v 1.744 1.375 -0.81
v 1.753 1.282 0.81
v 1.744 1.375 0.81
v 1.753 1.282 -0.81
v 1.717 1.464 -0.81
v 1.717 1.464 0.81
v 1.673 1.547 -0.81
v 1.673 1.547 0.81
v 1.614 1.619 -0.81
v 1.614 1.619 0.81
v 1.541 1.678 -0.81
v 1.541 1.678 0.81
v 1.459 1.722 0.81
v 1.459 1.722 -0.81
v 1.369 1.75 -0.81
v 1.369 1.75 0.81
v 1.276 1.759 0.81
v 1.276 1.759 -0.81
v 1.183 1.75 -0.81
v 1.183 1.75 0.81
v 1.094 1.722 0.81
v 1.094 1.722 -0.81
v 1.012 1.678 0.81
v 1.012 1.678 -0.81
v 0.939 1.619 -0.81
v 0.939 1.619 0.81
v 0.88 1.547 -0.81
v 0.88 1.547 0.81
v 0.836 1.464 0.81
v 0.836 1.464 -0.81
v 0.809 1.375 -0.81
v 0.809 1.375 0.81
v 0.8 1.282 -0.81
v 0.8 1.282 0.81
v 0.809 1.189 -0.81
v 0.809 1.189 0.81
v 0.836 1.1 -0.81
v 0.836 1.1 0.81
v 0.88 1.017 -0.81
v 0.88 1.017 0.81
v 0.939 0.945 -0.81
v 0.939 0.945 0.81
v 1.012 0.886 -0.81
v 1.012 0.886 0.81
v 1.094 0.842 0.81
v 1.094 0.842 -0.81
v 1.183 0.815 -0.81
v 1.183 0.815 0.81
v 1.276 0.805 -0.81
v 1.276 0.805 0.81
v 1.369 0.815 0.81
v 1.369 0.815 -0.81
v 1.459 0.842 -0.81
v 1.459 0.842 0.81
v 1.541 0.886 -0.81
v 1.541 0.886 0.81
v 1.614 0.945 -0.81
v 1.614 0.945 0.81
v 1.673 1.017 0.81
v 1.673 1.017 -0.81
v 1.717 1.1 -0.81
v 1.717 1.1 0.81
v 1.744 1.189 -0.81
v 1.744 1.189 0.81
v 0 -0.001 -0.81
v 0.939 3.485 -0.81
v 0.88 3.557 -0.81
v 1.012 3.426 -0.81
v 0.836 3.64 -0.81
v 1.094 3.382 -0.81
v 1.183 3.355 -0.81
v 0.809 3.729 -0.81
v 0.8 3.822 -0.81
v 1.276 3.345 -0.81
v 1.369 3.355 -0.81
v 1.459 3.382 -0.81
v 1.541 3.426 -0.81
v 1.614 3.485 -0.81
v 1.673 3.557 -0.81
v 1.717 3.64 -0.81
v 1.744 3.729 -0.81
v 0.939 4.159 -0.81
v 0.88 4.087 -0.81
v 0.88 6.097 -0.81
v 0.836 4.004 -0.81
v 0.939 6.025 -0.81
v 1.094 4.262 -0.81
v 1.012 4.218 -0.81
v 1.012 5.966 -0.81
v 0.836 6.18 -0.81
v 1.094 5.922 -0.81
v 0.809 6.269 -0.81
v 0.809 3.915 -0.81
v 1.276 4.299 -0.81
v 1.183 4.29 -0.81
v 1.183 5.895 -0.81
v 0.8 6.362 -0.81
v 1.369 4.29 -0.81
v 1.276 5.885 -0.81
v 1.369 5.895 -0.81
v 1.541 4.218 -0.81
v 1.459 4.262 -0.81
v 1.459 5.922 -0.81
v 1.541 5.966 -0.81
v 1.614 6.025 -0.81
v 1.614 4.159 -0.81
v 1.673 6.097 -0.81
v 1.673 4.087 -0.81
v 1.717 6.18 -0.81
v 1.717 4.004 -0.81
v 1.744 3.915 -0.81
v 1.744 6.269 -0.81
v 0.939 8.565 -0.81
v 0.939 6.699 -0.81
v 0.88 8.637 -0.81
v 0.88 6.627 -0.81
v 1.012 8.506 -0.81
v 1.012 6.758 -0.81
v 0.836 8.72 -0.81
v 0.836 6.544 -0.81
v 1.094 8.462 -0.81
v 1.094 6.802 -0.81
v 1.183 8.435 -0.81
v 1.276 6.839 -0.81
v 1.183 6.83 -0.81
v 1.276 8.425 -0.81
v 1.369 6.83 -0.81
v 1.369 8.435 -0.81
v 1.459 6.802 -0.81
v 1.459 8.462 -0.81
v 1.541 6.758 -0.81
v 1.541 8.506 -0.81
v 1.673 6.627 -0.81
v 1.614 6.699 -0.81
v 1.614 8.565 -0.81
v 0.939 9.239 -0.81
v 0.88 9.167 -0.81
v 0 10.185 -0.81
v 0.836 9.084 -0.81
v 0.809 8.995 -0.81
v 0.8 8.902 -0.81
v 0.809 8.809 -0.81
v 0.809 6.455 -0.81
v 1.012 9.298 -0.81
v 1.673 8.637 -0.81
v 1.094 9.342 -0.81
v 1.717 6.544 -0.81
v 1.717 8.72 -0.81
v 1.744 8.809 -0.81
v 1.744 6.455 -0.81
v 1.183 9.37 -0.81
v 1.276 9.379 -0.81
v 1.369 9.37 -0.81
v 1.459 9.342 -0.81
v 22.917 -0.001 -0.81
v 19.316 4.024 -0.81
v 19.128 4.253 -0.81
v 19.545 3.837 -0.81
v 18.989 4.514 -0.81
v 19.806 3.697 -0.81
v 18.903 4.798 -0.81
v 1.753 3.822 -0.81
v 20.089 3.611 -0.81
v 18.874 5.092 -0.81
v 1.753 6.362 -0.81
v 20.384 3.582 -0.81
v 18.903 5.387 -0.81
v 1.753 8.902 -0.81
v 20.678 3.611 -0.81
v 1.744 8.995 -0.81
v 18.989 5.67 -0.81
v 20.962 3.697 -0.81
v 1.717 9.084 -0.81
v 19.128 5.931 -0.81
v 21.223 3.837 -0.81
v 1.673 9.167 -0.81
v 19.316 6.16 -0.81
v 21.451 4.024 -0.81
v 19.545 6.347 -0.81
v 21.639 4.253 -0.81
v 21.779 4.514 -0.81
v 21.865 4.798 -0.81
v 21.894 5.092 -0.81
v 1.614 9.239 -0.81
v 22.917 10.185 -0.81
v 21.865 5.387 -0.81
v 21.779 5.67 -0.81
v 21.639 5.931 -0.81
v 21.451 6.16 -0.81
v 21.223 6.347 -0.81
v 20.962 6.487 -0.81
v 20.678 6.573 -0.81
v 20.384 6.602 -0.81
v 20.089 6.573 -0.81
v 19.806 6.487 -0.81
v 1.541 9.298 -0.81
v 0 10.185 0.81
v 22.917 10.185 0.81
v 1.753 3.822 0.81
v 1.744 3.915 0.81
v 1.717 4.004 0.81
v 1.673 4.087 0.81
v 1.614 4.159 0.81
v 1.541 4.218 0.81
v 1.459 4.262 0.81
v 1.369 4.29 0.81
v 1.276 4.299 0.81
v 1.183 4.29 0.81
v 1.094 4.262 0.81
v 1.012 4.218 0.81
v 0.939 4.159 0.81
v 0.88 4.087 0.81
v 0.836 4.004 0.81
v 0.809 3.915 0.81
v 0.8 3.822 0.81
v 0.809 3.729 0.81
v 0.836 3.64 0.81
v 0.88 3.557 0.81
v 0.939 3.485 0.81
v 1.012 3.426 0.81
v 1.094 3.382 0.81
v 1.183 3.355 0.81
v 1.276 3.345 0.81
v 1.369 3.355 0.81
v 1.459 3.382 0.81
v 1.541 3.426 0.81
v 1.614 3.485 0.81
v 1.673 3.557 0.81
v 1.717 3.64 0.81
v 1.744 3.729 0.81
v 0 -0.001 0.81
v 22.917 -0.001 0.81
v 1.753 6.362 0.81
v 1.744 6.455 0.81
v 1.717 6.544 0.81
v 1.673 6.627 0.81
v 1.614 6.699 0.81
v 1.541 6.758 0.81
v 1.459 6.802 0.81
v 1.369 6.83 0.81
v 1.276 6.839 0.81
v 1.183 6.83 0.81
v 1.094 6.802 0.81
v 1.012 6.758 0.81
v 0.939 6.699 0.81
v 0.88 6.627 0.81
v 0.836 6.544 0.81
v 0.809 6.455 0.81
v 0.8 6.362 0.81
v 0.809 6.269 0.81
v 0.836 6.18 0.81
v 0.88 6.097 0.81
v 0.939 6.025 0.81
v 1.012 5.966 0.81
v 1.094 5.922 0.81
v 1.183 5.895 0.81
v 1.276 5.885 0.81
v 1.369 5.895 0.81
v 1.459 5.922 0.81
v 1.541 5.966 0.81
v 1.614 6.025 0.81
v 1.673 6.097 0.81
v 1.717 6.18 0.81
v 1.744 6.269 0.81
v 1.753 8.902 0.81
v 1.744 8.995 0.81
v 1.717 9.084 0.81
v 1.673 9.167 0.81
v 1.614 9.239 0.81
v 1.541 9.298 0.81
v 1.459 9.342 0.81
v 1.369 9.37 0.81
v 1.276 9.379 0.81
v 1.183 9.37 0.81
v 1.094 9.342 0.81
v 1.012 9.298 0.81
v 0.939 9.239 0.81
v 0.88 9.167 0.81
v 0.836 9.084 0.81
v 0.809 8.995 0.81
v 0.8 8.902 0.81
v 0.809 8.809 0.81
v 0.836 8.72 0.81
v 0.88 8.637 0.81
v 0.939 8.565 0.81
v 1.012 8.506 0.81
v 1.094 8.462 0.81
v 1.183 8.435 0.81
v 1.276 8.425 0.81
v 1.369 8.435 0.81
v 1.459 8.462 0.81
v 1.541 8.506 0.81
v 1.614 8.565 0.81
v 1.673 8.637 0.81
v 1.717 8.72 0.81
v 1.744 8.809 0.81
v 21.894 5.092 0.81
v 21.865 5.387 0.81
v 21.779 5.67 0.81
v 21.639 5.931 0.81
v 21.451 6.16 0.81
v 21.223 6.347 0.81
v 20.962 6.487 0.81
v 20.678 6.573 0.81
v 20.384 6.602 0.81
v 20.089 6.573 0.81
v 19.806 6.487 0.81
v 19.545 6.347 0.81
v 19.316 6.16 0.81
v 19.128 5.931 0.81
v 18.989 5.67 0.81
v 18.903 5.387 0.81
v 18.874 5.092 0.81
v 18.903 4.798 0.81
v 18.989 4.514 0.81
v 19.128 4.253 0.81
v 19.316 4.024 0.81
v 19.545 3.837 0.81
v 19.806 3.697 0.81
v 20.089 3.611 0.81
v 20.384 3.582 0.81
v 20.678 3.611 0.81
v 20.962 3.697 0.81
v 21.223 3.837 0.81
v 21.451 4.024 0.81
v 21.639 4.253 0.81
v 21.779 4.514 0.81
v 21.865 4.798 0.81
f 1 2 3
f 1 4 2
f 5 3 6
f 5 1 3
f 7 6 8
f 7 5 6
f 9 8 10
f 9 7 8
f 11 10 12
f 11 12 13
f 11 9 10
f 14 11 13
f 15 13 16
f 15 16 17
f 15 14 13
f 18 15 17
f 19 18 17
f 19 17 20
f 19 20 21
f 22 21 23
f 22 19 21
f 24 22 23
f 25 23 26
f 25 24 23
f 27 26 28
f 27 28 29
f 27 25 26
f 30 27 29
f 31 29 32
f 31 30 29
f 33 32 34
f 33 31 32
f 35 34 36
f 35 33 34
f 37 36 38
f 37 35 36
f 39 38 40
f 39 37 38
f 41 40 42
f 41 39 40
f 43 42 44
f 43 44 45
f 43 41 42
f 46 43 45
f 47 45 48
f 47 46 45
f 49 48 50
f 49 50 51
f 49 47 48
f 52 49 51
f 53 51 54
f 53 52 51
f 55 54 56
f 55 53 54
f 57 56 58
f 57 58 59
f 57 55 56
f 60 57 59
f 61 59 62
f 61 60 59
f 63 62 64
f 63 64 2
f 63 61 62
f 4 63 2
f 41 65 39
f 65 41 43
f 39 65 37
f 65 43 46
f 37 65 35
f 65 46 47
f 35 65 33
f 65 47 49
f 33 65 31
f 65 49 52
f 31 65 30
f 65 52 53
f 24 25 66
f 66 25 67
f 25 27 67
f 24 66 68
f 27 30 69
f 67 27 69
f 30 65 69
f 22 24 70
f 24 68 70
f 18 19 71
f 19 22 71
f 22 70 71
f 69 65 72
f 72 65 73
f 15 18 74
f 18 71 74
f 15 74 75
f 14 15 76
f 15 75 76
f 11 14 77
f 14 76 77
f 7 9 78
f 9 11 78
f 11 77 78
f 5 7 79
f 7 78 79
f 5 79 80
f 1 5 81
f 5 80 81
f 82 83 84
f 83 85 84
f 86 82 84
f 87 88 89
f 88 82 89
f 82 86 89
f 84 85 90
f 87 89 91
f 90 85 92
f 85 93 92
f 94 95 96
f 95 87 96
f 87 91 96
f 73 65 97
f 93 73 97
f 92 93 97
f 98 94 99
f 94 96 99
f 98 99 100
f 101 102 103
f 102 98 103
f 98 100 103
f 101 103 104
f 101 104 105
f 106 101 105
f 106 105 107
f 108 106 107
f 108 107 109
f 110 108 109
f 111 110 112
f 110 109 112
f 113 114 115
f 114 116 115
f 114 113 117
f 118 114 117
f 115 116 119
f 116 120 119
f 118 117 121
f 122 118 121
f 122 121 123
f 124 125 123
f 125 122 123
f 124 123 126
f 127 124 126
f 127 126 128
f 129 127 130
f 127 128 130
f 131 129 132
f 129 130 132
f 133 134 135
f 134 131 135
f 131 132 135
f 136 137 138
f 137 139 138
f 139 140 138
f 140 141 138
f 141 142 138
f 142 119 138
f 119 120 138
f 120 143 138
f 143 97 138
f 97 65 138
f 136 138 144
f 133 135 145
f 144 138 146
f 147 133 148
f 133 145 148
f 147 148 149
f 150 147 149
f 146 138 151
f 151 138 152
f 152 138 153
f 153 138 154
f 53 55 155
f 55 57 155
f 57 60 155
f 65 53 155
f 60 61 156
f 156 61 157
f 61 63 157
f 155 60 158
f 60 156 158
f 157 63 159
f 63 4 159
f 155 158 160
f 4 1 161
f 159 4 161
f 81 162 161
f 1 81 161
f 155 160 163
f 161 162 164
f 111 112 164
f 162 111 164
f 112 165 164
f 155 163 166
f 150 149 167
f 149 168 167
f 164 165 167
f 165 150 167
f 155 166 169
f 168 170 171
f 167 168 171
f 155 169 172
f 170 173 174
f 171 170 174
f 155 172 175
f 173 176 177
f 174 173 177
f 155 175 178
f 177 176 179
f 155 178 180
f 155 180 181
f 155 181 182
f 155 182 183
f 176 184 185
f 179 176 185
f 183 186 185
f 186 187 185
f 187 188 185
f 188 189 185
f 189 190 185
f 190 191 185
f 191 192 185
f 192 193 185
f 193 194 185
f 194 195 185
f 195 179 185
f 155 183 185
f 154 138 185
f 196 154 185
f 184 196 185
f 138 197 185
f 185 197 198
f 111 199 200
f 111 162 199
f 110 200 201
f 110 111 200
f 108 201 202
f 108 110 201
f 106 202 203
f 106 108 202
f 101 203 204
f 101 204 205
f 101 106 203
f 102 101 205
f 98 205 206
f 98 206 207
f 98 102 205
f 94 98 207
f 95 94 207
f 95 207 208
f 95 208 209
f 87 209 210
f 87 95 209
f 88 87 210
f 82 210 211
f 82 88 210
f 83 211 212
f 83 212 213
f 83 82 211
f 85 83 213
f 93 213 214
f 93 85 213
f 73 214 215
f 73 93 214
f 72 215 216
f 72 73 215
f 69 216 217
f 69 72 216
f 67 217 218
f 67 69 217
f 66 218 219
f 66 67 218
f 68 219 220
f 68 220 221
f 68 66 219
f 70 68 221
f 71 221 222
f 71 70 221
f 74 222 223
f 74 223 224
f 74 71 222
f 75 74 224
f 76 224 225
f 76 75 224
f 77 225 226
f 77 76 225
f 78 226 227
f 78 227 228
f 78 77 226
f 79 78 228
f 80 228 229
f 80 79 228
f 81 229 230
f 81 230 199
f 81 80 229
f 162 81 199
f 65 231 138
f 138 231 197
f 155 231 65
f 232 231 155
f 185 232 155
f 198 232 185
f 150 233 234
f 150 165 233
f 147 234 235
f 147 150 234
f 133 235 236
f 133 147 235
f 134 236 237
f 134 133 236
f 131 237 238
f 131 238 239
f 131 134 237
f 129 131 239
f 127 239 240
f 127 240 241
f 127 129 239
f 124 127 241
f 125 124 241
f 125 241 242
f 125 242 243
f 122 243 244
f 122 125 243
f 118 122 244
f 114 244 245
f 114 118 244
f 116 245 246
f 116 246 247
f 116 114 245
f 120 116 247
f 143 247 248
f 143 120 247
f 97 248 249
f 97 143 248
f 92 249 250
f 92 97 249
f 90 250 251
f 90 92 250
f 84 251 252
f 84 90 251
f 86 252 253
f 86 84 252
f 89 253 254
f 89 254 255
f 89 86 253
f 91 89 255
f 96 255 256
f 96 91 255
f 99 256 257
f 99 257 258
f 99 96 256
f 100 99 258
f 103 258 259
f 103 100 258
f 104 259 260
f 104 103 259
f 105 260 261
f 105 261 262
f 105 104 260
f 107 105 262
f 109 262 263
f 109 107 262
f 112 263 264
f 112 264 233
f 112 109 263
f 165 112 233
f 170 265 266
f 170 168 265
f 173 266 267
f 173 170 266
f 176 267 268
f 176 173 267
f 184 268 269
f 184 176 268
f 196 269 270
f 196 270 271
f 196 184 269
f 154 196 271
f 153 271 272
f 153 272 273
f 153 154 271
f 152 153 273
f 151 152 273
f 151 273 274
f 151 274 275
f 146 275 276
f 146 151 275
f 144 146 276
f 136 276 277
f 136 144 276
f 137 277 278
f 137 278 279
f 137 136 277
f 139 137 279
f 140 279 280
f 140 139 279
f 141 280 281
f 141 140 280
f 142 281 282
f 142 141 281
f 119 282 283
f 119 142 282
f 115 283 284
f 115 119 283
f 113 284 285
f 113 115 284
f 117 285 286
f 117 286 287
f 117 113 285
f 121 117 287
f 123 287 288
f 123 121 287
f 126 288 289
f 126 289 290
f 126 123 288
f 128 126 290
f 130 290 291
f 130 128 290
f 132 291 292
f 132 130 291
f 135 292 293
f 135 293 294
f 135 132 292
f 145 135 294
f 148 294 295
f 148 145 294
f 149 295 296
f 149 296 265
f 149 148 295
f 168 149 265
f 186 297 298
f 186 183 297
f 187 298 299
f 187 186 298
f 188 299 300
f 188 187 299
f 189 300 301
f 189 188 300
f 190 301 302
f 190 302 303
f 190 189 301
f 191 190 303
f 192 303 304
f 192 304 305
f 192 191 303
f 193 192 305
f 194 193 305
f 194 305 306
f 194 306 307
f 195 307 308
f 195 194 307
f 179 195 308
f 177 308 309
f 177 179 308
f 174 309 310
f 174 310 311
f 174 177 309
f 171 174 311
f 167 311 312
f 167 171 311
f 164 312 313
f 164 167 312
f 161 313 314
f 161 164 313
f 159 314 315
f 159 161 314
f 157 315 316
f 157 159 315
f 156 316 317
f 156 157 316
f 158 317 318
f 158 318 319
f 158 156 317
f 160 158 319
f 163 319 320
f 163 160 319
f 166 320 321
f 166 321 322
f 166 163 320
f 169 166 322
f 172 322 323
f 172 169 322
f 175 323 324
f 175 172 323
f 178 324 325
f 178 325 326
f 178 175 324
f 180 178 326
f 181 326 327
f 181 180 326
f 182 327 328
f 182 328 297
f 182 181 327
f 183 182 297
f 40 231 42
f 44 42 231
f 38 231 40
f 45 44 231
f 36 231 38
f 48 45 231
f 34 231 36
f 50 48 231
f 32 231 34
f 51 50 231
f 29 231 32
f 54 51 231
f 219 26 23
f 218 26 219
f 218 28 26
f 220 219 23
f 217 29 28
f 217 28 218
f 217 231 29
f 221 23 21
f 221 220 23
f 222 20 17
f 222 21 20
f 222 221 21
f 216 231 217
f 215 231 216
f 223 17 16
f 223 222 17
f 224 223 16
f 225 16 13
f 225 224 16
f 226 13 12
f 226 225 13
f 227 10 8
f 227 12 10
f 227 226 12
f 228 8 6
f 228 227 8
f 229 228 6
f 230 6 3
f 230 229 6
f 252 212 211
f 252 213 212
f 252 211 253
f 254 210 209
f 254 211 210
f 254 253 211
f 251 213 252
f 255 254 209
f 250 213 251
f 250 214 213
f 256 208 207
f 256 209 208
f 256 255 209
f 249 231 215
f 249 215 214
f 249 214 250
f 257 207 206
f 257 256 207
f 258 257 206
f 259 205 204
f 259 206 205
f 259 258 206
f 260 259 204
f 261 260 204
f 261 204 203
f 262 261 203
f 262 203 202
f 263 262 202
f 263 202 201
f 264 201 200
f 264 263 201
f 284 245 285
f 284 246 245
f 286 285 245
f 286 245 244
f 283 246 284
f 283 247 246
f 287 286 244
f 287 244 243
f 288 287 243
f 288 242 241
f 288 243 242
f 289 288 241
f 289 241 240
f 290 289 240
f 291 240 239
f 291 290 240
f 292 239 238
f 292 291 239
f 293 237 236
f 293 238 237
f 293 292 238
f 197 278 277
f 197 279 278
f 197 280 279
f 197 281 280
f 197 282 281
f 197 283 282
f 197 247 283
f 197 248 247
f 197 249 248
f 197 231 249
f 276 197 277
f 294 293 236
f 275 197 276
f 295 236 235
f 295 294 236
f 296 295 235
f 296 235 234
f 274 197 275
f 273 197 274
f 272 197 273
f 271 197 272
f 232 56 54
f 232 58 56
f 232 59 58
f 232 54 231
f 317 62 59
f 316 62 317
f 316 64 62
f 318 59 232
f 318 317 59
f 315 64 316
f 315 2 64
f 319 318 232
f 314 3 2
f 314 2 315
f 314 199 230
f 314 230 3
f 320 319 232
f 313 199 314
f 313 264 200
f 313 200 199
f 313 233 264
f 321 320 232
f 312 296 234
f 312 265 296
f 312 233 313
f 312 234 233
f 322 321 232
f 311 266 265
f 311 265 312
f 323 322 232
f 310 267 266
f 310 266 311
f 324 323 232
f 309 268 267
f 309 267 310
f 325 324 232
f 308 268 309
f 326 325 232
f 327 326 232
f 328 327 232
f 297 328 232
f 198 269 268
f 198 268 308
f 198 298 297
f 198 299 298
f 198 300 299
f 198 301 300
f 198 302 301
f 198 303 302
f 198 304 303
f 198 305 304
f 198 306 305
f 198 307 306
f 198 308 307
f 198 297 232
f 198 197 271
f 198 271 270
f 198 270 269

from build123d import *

# Parameters (mm, degrees)
SKETCH1_W           = 22.917169521
SKETCH1_H           = 10.185584258
SKETCH1_R           = 1.509847023
SKETCH1_R_2         = 0.476625594
BOSS_EXTRUDE1_DEPTH = 0.81


with BuildPart() as part:
    # Sketch1 → Boss-Extrude1 (new, symmetric)
    with BuildSketch(Plane.XY):
        with Locations((11.45856993, 5.092103028)):
            Rectangle(SKETCH1_W, SKETCH1_H)
        with Locations((20.383783826, 5.092103028)):
            Circle(SKETCH1_R, mode=Mode.SUBTRACT)
        with Locations((1.27648108, 8.902103028)):
            Circle(SKETCH1_R_2, mode=Mode.SUBTRACT)
        with Locations((1.27648108, 6.362103028)):
            Circle(SKETCH1_R_2, mode=Mode.SUBTRACT)
        with Locations((1.27648108, 3.822103028)):
            Circle(SKETCH1_R_2, mode=Mode.SUBTRACT)
        with Locations((1.27648108, 1.282103028)):
            Circle(SKETCH1_R_2, mode=Mode.SUBTRACT)
    extrude(amount=BOSS_EXTRUDE1_DEPTH, both=True)


solid = part.part
